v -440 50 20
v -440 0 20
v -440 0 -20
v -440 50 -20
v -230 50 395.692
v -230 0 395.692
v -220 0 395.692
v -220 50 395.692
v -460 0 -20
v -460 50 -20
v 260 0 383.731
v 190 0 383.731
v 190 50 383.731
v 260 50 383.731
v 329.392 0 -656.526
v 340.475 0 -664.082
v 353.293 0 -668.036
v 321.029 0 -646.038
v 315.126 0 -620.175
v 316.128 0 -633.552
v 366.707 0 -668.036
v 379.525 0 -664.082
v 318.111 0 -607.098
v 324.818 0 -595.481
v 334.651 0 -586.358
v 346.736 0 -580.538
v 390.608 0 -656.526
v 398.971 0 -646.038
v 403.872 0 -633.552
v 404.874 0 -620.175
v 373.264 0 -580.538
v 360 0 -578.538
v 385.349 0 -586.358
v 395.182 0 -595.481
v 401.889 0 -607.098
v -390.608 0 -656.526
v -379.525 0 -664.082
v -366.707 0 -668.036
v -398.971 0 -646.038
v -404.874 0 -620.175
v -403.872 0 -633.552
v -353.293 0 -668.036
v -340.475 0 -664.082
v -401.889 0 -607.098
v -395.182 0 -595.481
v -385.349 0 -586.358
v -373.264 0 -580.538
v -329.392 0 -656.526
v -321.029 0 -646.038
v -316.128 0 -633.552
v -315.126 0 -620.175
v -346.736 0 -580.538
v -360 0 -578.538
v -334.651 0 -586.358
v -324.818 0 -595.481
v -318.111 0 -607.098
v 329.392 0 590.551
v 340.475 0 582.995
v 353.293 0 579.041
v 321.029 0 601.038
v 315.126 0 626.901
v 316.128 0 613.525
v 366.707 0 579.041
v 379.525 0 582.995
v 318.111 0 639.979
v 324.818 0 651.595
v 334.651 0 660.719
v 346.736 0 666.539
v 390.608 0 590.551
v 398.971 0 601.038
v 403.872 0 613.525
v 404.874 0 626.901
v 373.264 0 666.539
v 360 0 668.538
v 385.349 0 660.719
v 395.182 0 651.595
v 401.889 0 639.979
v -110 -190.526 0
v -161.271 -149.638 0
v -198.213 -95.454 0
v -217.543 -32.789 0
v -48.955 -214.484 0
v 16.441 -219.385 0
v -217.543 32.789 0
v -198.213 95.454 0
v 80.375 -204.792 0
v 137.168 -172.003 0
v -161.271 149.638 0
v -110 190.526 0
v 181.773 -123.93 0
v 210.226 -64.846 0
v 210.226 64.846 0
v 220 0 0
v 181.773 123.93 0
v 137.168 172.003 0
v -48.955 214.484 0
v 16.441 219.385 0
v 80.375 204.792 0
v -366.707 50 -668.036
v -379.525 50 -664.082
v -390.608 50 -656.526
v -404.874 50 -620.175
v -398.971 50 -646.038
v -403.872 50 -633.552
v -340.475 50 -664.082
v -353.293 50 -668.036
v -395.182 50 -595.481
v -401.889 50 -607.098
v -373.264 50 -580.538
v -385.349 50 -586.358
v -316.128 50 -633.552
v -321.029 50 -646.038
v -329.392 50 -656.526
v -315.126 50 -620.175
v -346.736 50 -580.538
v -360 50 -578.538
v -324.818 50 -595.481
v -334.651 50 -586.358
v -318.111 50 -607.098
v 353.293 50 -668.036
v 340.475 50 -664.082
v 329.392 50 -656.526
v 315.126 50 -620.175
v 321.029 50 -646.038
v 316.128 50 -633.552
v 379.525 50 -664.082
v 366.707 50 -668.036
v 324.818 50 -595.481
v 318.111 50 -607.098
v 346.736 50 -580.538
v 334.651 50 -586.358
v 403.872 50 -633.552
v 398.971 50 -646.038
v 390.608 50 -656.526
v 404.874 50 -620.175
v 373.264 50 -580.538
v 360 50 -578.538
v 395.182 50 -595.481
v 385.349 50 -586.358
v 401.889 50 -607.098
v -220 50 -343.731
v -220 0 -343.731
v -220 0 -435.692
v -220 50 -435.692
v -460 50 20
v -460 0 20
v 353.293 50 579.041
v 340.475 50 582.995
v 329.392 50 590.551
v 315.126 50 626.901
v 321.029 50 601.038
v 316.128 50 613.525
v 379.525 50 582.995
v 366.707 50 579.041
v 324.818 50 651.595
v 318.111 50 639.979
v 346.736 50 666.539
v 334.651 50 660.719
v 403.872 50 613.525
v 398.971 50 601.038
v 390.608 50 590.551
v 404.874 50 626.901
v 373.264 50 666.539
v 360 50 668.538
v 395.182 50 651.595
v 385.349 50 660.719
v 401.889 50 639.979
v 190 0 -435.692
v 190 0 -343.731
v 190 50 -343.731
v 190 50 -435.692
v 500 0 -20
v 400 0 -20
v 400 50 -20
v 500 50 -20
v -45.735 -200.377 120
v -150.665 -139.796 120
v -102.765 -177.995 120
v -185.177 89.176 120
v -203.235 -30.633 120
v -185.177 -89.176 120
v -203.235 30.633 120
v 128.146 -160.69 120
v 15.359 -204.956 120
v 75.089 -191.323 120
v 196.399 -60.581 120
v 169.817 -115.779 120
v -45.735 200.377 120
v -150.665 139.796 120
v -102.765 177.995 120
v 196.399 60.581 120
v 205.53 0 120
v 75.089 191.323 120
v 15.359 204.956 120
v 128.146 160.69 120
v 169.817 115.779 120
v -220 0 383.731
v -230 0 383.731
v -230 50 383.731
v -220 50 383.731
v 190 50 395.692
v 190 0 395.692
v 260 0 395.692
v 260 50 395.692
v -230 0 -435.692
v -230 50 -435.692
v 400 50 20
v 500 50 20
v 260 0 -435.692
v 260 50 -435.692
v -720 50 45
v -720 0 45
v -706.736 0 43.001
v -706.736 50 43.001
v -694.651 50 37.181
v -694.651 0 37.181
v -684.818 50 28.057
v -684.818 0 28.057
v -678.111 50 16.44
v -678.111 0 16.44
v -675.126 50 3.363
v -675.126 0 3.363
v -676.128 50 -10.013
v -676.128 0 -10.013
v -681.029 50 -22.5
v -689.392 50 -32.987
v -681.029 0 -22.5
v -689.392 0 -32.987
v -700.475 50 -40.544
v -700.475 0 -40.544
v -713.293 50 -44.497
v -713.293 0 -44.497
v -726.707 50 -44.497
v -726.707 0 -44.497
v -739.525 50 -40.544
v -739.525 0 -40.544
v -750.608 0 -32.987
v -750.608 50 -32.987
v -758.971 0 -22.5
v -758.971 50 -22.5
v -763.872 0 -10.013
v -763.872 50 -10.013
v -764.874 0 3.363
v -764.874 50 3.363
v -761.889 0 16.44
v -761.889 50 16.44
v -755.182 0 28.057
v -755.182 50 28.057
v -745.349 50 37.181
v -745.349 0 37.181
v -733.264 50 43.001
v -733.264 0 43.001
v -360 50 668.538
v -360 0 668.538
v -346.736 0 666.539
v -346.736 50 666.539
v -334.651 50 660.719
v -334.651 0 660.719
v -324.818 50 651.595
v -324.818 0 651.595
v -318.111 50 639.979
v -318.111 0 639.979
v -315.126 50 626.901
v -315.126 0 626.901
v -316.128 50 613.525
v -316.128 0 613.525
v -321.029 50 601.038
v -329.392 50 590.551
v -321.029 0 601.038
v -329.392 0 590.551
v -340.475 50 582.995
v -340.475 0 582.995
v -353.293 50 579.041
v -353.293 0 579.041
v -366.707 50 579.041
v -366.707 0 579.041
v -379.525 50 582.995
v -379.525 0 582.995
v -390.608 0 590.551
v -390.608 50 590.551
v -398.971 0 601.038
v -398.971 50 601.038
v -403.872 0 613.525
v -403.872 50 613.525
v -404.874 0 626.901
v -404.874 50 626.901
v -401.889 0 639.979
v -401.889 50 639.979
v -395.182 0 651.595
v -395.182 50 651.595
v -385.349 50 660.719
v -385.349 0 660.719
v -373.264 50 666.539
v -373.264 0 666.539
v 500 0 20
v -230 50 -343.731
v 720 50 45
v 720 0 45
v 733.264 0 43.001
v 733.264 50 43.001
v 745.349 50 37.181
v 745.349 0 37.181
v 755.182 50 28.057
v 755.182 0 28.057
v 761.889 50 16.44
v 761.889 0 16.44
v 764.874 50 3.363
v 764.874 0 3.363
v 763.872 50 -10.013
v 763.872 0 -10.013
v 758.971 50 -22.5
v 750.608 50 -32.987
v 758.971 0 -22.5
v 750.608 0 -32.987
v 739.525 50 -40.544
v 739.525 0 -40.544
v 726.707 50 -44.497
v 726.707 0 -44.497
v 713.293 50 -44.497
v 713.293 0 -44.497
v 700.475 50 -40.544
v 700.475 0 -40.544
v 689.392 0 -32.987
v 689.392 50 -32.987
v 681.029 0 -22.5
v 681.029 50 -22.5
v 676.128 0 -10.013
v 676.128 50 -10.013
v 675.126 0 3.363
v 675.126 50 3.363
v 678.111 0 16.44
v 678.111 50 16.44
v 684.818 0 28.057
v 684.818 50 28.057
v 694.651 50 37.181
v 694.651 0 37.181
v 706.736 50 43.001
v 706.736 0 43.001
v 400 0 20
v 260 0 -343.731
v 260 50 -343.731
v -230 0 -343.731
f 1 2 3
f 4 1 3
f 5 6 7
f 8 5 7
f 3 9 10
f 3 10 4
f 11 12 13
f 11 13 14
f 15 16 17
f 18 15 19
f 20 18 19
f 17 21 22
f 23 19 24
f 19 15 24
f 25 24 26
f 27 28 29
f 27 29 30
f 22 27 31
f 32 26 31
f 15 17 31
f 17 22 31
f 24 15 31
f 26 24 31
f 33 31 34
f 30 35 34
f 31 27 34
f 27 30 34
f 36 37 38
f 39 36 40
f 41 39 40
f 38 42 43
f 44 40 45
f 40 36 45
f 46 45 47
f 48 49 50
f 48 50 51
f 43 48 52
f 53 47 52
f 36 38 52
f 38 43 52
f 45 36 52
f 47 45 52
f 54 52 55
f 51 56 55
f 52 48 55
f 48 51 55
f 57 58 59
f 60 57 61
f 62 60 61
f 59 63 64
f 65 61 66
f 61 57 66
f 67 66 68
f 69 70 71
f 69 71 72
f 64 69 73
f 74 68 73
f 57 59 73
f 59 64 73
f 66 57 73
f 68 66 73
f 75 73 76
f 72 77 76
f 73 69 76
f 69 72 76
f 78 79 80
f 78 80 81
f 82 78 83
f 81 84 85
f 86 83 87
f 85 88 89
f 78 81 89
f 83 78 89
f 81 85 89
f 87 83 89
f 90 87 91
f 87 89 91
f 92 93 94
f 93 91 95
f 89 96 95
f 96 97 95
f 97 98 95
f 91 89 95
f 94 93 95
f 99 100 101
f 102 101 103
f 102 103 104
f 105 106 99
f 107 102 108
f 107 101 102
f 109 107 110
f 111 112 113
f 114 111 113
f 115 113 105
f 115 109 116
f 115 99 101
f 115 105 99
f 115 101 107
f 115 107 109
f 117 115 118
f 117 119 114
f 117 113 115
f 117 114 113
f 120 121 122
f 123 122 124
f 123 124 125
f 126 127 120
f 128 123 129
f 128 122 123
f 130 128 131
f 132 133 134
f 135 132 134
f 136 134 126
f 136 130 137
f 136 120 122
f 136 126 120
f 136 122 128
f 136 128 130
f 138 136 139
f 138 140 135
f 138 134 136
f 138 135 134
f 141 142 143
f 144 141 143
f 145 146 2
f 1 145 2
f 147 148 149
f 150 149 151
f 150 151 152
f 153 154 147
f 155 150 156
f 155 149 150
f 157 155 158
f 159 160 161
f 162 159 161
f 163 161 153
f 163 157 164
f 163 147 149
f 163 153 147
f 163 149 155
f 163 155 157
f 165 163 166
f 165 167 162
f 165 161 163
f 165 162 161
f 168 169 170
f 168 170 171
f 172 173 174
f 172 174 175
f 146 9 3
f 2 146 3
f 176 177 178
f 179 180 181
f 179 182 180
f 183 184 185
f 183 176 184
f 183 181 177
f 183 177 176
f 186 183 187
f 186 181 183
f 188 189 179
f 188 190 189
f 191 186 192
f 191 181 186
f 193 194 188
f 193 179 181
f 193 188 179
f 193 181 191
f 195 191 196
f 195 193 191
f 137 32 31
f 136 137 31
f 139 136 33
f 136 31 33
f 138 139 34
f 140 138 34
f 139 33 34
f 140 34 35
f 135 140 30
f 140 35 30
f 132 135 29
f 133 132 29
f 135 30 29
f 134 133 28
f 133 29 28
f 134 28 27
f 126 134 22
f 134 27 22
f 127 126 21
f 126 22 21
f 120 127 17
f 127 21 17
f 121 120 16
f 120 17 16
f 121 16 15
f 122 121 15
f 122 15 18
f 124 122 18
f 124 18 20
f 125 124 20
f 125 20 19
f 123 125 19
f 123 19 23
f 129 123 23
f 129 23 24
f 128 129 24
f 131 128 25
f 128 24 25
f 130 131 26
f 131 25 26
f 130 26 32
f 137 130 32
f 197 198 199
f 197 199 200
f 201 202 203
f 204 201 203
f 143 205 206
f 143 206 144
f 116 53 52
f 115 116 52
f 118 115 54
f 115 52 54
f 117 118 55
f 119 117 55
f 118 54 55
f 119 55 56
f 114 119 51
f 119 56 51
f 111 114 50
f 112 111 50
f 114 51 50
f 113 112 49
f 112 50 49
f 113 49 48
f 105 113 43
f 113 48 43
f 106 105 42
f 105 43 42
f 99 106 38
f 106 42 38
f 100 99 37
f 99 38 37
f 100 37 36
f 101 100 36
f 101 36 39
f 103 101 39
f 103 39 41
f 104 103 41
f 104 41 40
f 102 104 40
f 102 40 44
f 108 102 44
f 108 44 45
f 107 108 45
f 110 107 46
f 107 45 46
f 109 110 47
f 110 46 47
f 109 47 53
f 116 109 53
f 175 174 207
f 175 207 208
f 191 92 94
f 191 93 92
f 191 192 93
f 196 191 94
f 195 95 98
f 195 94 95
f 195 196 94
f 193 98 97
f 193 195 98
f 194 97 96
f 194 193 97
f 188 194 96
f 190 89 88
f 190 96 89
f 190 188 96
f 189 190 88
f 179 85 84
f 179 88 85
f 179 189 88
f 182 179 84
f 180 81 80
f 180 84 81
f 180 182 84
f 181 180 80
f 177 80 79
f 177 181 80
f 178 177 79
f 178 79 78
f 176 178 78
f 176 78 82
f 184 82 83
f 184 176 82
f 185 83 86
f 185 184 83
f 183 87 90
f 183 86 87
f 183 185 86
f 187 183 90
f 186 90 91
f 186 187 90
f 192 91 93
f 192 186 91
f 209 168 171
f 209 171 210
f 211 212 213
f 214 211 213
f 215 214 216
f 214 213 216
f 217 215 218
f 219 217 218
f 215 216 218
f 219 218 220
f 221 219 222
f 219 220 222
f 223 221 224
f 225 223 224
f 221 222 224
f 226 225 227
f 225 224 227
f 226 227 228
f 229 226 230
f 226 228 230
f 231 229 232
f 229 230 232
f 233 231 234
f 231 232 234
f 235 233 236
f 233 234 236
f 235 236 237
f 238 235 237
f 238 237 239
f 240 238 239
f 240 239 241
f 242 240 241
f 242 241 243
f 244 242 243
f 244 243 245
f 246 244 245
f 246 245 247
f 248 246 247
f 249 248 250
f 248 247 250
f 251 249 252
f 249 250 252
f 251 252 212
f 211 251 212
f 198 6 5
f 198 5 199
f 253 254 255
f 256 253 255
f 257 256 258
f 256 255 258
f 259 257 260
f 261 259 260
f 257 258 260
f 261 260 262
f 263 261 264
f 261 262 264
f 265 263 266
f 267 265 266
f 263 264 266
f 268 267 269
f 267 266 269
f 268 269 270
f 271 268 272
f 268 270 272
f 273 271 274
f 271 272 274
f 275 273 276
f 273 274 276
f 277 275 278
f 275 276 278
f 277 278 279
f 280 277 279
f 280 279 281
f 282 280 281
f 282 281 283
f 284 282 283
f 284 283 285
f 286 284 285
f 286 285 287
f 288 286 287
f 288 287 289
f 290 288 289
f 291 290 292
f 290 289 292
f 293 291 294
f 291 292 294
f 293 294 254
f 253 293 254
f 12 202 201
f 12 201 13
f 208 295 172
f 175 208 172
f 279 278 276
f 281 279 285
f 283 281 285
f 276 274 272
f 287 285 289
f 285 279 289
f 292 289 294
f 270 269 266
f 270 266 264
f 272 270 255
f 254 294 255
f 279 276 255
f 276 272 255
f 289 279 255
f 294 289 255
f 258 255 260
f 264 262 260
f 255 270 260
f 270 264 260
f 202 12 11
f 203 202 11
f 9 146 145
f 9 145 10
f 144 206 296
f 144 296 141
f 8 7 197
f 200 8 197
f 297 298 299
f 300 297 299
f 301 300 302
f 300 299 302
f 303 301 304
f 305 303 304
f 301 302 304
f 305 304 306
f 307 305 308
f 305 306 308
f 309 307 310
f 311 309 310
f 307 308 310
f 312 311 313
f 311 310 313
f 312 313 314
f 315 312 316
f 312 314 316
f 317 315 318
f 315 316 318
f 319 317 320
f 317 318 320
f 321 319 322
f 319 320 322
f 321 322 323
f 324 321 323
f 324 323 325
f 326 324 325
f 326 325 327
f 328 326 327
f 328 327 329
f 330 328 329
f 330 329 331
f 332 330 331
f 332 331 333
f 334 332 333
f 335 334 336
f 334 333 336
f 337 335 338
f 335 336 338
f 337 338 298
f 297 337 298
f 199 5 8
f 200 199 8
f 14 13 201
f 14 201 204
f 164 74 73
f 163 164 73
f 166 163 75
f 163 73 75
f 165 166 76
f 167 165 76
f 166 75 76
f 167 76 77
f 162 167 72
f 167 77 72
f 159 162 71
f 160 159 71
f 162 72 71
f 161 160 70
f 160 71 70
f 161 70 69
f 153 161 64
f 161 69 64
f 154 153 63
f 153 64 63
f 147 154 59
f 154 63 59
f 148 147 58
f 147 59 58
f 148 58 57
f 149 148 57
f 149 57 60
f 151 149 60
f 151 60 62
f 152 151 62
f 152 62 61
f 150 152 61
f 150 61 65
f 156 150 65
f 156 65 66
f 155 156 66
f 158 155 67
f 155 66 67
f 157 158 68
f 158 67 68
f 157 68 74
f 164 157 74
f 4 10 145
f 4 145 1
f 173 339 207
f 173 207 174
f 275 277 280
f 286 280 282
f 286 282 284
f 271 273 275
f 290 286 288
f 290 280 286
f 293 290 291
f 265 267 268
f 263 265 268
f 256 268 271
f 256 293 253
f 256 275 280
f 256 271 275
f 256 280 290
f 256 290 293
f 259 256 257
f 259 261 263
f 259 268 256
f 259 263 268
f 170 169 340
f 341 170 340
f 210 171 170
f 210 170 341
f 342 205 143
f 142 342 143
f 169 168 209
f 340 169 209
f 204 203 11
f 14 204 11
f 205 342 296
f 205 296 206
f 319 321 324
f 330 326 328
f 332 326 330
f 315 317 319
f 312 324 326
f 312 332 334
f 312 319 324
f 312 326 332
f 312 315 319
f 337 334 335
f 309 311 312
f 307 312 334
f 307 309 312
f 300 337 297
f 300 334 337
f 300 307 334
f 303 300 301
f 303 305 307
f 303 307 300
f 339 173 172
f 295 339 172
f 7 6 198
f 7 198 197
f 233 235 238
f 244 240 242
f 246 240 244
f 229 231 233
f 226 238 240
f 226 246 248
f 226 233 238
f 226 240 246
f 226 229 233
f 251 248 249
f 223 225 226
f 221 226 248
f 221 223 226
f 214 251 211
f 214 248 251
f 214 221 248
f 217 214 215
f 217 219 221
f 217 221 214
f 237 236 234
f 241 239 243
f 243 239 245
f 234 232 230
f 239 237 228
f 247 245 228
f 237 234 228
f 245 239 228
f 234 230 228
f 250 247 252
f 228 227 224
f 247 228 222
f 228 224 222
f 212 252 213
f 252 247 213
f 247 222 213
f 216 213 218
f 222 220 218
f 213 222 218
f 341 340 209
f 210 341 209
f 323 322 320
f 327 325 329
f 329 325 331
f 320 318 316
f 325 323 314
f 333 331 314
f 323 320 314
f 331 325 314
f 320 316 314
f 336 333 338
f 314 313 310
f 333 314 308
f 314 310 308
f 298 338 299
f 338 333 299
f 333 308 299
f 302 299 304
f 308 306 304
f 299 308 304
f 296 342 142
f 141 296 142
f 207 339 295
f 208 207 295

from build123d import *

# Parameters (mm, degrees)
SKETCH1_R              = 220
BOSS_EXTRUDE1_DEPTH    = 120
BOSS_EXTRUDE1_TAPER    = 6.875493542
SKETCH2_R              = 45
BOSS_EXTRUDE2_DEPTH    = 50
BOSS_EXTRUDE2_2_DEPTH  = 50
BOSS_EXTRUDE2_3_DEPTH  = 50
BOSS_EXTRUDE2_4_DEPTH  = 50
BOSS_EXTRUDE2_5_DEPTH  = 50
BOSS_EXTRUDE2_6_DEPTH  = 50
SKETCH2_W              = 100
SKETCH2_H              = 40
BOSS_EXTRUDE2_7_DEPTH  = 50
SKETCH2_W_2            = 70
SKETCH2_H_2            = 91.961524228
BOSS_EXTRUDE2_8_DEPTH  = 50
SKETCH2_W_3            = 10
BOSS_EXTRUDE2_9_DEPTH  = 50
SKETCH2_W_4            = 20
BOSS_EXTRUDE2_10_DEPTH = 50
SKETCH2_H_3            = 11.961524228
BOSS_EXTRUDE2_11_DEPTH = 50
BOSS_EXTRUDE2_12_DEPTH = 50


with BuildPart() as part:
    # Sketch1 → Boss-Extrude1 (new body)
    with BuildSketch(Plane.XY):
        Circle(SKETCH1_R)
    extrude(amount=BOSS_EXTRUDE1_DEPTH, taper=BOSS_EXTRUDE1_TAPER)


with BuildPart() as body_2:
    # Sketch2 → Boss-Extrude2 (new body)
    with BuildSketch(Plane(origin=(0, 0, 0), x_dir=(1, 0, 0), z_dir=(0, 1, 0))):
        with Locations(Location((720, 0, 0), (0, 0, 270))):
            Circle(SKETCH2_R)
    extrude(amount=BOSS_EXTRUDE2_DEPTH)


with BuildPart() as body_3:
    # Sketch2 → Boss-Extrude2 2 (new body)
    with BuildSketch(Plane(origin=(0, 0, 0), x_dir=(1, 0, 0), z_dir=(0, 1, 0))):
        with Locations(Location((360, 623.538290725, 0), (0, 0, 270))):
            Circle(SKETCH2_R)
    extrude(amount=BOSS_EXTRUDE2_2_DEPTH)


with BuildPart() as body_4:
    # Sketch2 → Boss-Extrude2 3 (new body)
    with BuildSketch(Plane(origin=(0, 0, 0), x_dir=(1, 0, 0), z_dir=(0, 1, 0))):
        with Locations(Location((-360, 623.538290725, 0), (0, 0, 270))):
            Circle(SKETCH2_R)
    extrude(amount=BOSS_EXTRUDE2_3_DEPTH)


with BuildPart() as body_5:
    # Sketch2 → Boss-Extrude2 4 (new body)
    with BuildSketch(Plane(origin=(0, 0, 0), x_dir=(1, 0, 0), z_dir=(0, 1, 0))):
        with Locations(Location((-720, 0, 0), (0, 0, 270))):
            Circle(SKETCH2_R)
    extrude(amount=BOSS_EXTRUDE2_4_DEPTH)


with BuildPart() as body_6:
    # Sketch2 → Boss-Extrude2 5 (new body)
    with BuildSketch(Plane(origin=(0, 0, 0), x_dir=(1, 0, 0), z_dir=(0, 1, 0))):
        with Locations(Location((-360, -623.538290725, 0), (0, 0, 270))):
            Circle(SKETCH2_R)
    extrude(amount=BOSS_EXTRUDE2_5_DEPTH)


with BuildPart() as body_7:
    # Sketch2 → Boss-Extrude2 6 (new body)
    with BuildSketch(Plane(origin=(0, 0, 0), x_dir=(1, 0, 0), z_dir=(0, 1, 0))):
        with Locations(Location((360, -623.538290725, 0), (0, 0, 270))):
            Circle(SKETCH2_R)
    extrude(amount=BOSS_EXTRUDE2_6_DEPTH)


with BuildPart() as body_8:
    # Sketch2 → Boss-Extrude2 7 (new body)
    with BuildSketch(Plane(origin=(0, 0, 0), x_dir=(1, 0, 0), z_dir=(0, 1, 0))):
        with Locations((450, 0)):
            Rectangle(SKETCH2_W, SKETCH2_H)
    extrude(amount=BOSS_EXTRUDE2_7_DEPTH)


with BuildPart() as body_9:
    # Sketch2 → Boss-Extrude2 8 (new body)
    with BuildSketch(Plane(origin=(0, 0, 0), x_dir=(1, 0, 0), z_dir=(0, 1, 0))):
        with Locations((225, 389.711431703)):
            Rectangle(SKETCH2_W_2, SKETCH2_H_2)
    extrude(amount=BOSS_EXTRUDE2_8_DEPTH)


with BuildPart() as body_10:
    # Sketch2 → Boss-Extrude2 9 (new body)
    with BuildSketch(Plane(origin=(0, 0, 0), x_dir=(1, 0, 0), z_dir=(0, 1, 0))):
        with Locations((-225, 389.711431703)):
            Rectangle(SKETCH2_W_3, SKETCH2_H_2)
    extrude(amount=BOSS_EXTRUDE2_9_DEPTH)


with BuildPart() as body_11:
    # Sketch2 → Boss-Extrude2 10 (new body)
    with BuildSketch(Plane(origin=(0, 0, 0), x_dir=(1, 0, 0), z_dir=(0, 1, 0))):
        with Locations((-450, 0)):
            Rectangle(SKETCH2_W_4, SKETCH2_H)
    extrude(amount=BOSS_EXTRUDE2_10_DEPTH)


with BuildPart() as body_12:
    # Sketch2 → Boss-Extrude2 11 (new body)
    with BuildSketch(Plane(origin=(0, 0, 0), x_dir=(1, 0, 0), z_dir=(0, 1, 0))):
        with Locations((-225, -389.711431703)):
            Rectangle(SKETCH2_W_3, SKETCH2_H_3)
    extrude(amount=BOSS_EXTRUDE2_11_DEPTH)


with BuildPart() as body_13:
    # Sketch2 → Boss-Extrude2 12 (new body)
    with BuildSketch(Plane(origin=(0, 0, 0), x_dir=(1, 0, 0), z_dir=(0, 1, 0))):
        with Locations((225, -389.711431703)):
            Rectangle(SKETCH2_W_2, SKETCH2_H_3)
    extrude(amount=BOSS_EXTRUDE2_12_DEPTH)


solid = Compound([part.part, body_2.part, body_3.part, body_4.part, body_5.part, body_6.part, body_7.part, body_8.part, body_9.part, body_10.part, body_11.part, body_12.part, body_13.part])
